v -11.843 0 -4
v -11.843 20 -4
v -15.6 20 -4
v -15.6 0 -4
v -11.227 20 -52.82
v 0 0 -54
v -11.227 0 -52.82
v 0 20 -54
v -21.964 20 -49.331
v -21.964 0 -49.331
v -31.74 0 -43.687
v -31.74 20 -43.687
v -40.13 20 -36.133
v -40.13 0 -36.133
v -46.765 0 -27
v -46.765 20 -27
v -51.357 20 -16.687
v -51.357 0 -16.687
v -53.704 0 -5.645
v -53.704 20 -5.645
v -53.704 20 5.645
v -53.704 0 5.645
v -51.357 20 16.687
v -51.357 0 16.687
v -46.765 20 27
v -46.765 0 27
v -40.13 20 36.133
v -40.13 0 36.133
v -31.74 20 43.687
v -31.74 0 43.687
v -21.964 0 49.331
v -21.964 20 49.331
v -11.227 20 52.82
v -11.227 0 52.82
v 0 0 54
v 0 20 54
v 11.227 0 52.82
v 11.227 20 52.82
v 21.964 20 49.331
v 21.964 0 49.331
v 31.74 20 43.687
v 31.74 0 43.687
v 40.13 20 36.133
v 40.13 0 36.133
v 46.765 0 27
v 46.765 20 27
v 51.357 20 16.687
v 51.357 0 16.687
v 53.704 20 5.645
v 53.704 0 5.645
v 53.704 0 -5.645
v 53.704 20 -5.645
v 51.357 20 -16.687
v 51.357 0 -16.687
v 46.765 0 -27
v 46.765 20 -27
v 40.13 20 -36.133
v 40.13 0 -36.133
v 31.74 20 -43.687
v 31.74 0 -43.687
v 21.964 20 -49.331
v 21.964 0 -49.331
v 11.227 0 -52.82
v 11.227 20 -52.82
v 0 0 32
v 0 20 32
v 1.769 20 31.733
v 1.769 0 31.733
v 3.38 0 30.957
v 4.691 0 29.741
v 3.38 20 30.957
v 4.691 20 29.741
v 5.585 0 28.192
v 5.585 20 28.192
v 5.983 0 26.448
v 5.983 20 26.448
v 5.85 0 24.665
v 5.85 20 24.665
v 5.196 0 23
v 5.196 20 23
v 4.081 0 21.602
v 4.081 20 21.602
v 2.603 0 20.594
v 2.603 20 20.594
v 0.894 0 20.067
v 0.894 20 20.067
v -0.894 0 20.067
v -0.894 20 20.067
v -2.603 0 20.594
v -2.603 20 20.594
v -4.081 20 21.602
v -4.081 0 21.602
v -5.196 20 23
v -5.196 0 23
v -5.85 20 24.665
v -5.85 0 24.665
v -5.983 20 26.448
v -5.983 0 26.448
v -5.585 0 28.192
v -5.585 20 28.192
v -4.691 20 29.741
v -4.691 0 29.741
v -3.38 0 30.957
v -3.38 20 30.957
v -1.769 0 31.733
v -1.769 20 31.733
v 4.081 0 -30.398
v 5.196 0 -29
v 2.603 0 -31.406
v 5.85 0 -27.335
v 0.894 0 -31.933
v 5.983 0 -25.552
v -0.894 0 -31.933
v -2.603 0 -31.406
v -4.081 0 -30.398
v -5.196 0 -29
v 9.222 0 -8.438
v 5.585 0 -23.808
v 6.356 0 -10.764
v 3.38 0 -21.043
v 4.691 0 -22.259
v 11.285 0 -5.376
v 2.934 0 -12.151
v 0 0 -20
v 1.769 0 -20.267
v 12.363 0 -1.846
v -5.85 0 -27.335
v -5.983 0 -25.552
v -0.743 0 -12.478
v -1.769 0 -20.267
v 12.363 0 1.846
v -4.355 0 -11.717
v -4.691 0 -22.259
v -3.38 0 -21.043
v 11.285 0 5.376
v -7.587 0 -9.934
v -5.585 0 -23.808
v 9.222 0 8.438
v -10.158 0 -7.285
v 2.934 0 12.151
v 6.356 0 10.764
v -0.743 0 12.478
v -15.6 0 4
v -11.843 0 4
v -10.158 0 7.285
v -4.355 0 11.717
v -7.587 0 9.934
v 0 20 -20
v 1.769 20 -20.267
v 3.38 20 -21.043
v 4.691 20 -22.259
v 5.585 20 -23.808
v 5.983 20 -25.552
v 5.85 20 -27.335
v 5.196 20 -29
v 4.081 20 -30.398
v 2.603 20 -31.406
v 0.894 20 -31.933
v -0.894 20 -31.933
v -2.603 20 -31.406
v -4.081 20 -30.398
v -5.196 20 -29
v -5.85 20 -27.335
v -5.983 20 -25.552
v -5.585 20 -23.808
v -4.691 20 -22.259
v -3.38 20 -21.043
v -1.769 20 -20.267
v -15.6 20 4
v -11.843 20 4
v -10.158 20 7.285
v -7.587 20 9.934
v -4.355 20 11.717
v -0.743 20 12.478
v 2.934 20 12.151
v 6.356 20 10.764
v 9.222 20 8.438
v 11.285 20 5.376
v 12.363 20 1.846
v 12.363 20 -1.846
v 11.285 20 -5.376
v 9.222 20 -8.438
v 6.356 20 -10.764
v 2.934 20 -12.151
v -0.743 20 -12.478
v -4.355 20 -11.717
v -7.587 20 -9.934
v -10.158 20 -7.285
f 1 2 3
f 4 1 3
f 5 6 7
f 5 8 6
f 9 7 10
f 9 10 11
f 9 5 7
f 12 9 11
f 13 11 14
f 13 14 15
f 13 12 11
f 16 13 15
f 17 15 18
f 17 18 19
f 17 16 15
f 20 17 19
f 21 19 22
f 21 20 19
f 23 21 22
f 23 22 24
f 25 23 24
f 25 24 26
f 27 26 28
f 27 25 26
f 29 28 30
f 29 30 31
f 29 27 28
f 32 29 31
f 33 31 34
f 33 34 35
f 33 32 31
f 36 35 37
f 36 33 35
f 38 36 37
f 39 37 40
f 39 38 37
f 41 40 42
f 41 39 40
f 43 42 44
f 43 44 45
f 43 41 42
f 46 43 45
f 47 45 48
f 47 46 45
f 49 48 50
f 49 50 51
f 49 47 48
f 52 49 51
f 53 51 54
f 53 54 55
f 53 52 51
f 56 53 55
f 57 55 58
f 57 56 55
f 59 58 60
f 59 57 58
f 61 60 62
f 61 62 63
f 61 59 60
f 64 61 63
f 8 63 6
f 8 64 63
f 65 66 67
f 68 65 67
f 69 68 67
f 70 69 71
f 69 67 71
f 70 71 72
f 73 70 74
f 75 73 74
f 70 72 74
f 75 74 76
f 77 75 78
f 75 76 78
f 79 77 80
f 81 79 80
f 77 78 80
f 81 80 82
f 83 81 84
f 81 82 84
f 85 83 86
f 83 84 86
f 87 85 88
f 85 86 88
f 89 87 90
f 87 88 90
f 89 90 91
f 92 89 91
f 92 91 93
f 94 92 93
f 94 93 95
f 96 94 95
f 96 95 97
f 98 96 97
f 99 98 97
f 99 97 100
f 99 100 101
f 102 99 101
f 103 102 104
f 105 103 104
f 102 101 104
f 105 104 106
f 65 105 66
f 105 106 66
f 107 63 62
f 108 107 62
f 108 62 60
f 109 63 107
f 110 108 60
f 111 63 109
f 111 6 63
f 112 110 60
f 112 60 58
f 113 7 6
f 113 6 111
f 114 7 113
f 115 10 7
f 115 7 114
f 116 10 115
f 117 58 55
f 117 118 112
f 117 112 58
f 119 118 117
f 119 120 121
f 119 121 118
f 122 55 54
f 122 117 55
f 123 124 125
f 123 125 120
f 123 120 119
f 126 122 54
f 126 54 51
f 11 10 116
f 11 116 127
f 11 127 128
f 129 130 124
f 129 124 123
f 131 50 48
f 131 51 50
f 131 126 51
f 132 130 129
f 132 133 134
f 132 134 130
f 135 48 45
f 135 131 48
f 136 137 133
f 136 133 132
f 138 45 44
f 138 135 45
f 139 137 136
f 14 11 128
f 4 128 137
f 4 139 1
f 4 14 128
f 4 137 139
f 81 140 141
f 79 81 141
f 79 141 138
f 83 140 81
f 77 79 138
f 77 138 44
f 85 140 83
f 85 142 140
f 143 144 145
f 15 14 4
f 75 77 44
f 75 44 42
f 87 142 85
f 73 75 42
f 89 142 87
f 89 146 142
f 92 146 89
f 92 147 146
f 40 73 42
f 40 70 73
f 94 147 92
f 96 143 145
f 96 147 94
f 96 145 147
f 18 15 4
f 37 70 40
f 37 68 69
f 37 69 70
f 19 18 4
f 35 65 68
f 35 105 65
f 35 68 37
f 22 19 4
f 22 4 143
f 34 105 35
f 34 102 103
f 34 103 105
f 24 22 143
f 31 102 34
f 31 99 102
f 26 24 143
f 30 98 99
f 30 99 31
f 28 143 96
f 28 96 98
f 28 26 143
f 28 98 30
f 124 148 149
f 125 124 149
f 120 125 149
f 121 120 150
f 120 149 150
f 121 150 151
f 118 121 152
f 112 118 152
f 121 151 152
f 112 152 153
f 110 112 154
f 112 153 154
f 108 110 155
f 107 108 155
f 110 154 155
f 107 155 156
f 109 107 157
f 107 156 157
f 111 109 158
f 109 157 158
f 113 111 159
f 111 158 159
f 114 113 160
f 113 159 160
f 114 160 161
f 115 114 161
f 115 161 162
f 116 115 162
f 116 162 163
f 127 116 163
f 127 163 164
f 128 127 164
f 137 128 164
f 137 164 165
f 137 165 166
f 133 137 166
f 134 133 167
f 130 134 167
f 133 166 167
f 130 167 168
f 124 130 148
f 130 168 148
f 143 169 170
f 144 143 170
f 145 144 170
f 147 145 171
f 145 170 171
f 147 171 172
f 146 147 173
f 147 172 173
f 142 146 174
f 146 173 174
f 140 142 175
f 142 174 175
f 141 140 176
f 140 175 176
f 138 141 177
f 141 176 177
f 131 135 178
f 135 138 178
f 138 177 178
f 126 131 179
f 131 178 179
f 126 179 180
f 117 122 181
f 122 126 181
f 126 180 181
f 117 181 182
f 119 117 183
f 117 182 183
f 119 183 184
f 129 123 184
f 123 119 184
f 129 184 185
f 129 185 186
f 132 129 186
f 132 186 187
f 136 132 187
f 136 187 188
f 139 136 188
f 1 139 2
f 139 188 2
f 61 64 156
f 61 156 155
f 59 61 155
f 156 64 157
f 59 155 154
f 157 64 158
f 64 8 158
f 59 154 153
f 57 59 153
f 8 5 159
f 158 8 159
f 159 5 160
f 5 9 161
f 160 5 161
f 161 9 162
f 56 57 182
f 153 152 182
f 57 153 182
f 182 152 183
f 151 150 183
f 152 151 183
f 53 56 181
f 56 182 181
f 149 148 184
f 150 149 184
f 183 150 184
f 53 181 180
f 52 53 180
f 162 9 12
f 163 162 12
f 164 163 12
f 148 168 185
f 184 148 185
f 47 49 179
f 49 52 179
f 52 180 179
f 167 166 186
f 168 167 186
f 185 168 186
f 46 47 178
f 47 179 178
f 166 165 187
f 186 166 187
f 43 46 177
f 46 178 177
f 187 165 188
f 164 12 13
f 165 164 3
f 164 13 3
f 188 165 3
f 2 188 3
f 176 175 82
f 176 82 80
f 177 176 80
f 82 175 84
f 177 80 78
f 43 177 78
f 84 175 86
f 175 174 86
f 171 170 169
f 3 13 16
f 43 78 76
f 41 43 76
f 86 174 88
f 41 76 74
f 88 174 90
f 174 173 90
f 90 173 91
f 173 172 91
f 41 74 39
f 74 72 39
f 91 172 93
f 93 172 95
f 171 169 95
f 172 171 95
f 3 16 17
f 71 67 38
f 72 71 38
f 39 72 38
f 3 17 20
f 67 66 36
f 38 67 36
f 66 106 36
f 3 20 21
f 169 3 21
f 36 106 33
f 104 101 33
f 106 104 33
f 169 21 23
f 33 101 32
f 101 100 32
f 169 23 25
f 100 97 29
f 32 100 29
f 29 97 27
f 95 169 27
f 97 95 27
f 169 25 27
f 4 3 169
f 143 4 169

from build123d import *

# Parameters (mm, degrees)
SKETCH_1_W          = 41.5
SKETCH_1_H          = 20
SKETCH_2_R          = 6
CUT_EXTRUDE_1_DEPTH = 20
SKETCH_2_3_R        = 6
CUT_EXTRUDE_2_DEPTH = 20


with BuildPart() as part:
    # Эскиз1 → Повернуть1 (revolve)
    with BuildSketch(Plane.XY):
        with Locations((33.25, 10)):
            Rectangle(SKETCH_1_W, SKETCH_1_H)
    revolve(axis=Axis((0, 0, 0), (0, 1, 0)))

    # Эскиз2 → Вырез-Вытянуть1 (cut)
    with BuildSketch(Plane(origin=(0, 20, 0), x_dir=(1, 0, 0), z_dir=(0, 1, 0))):
        with Locations((0, 26)):
            Circle(SKETCH_2_R)
    extrude(amount=-CUT_EXTRUDE_1_DEPTH, mode=Mode.SUBTRACT)

    # Эскиз2<3> → Вырез-Вытянуть2 (cut)
    with BuildSketch(Plane(origin=(0, 20, 0), x_dir=(1, 0, 0), z_dir=(0, 1, 0))):
        with Locations((0, 26)):
            Circle(SKETCH_2_3_R)
        with Locations((0, -26)):
            Circle(SKETCH_2_3_R)
        with BuildLine():
            Line((-11.842719282, 4), (-15.6, 4))
            Line((-15.6, 4), (-15.6, -4))
            Line((-15.6, -4), (-11.842719282, -4))
            ThreePointArc((-11.842719282, -4), (12.5, 0), (-11.842719282, 4))
        make_face()
    extrude(amount=-CUT_EXTRUDE_2_DEPTH, mode=Mode.SUBTRACT)


solid = part.part
